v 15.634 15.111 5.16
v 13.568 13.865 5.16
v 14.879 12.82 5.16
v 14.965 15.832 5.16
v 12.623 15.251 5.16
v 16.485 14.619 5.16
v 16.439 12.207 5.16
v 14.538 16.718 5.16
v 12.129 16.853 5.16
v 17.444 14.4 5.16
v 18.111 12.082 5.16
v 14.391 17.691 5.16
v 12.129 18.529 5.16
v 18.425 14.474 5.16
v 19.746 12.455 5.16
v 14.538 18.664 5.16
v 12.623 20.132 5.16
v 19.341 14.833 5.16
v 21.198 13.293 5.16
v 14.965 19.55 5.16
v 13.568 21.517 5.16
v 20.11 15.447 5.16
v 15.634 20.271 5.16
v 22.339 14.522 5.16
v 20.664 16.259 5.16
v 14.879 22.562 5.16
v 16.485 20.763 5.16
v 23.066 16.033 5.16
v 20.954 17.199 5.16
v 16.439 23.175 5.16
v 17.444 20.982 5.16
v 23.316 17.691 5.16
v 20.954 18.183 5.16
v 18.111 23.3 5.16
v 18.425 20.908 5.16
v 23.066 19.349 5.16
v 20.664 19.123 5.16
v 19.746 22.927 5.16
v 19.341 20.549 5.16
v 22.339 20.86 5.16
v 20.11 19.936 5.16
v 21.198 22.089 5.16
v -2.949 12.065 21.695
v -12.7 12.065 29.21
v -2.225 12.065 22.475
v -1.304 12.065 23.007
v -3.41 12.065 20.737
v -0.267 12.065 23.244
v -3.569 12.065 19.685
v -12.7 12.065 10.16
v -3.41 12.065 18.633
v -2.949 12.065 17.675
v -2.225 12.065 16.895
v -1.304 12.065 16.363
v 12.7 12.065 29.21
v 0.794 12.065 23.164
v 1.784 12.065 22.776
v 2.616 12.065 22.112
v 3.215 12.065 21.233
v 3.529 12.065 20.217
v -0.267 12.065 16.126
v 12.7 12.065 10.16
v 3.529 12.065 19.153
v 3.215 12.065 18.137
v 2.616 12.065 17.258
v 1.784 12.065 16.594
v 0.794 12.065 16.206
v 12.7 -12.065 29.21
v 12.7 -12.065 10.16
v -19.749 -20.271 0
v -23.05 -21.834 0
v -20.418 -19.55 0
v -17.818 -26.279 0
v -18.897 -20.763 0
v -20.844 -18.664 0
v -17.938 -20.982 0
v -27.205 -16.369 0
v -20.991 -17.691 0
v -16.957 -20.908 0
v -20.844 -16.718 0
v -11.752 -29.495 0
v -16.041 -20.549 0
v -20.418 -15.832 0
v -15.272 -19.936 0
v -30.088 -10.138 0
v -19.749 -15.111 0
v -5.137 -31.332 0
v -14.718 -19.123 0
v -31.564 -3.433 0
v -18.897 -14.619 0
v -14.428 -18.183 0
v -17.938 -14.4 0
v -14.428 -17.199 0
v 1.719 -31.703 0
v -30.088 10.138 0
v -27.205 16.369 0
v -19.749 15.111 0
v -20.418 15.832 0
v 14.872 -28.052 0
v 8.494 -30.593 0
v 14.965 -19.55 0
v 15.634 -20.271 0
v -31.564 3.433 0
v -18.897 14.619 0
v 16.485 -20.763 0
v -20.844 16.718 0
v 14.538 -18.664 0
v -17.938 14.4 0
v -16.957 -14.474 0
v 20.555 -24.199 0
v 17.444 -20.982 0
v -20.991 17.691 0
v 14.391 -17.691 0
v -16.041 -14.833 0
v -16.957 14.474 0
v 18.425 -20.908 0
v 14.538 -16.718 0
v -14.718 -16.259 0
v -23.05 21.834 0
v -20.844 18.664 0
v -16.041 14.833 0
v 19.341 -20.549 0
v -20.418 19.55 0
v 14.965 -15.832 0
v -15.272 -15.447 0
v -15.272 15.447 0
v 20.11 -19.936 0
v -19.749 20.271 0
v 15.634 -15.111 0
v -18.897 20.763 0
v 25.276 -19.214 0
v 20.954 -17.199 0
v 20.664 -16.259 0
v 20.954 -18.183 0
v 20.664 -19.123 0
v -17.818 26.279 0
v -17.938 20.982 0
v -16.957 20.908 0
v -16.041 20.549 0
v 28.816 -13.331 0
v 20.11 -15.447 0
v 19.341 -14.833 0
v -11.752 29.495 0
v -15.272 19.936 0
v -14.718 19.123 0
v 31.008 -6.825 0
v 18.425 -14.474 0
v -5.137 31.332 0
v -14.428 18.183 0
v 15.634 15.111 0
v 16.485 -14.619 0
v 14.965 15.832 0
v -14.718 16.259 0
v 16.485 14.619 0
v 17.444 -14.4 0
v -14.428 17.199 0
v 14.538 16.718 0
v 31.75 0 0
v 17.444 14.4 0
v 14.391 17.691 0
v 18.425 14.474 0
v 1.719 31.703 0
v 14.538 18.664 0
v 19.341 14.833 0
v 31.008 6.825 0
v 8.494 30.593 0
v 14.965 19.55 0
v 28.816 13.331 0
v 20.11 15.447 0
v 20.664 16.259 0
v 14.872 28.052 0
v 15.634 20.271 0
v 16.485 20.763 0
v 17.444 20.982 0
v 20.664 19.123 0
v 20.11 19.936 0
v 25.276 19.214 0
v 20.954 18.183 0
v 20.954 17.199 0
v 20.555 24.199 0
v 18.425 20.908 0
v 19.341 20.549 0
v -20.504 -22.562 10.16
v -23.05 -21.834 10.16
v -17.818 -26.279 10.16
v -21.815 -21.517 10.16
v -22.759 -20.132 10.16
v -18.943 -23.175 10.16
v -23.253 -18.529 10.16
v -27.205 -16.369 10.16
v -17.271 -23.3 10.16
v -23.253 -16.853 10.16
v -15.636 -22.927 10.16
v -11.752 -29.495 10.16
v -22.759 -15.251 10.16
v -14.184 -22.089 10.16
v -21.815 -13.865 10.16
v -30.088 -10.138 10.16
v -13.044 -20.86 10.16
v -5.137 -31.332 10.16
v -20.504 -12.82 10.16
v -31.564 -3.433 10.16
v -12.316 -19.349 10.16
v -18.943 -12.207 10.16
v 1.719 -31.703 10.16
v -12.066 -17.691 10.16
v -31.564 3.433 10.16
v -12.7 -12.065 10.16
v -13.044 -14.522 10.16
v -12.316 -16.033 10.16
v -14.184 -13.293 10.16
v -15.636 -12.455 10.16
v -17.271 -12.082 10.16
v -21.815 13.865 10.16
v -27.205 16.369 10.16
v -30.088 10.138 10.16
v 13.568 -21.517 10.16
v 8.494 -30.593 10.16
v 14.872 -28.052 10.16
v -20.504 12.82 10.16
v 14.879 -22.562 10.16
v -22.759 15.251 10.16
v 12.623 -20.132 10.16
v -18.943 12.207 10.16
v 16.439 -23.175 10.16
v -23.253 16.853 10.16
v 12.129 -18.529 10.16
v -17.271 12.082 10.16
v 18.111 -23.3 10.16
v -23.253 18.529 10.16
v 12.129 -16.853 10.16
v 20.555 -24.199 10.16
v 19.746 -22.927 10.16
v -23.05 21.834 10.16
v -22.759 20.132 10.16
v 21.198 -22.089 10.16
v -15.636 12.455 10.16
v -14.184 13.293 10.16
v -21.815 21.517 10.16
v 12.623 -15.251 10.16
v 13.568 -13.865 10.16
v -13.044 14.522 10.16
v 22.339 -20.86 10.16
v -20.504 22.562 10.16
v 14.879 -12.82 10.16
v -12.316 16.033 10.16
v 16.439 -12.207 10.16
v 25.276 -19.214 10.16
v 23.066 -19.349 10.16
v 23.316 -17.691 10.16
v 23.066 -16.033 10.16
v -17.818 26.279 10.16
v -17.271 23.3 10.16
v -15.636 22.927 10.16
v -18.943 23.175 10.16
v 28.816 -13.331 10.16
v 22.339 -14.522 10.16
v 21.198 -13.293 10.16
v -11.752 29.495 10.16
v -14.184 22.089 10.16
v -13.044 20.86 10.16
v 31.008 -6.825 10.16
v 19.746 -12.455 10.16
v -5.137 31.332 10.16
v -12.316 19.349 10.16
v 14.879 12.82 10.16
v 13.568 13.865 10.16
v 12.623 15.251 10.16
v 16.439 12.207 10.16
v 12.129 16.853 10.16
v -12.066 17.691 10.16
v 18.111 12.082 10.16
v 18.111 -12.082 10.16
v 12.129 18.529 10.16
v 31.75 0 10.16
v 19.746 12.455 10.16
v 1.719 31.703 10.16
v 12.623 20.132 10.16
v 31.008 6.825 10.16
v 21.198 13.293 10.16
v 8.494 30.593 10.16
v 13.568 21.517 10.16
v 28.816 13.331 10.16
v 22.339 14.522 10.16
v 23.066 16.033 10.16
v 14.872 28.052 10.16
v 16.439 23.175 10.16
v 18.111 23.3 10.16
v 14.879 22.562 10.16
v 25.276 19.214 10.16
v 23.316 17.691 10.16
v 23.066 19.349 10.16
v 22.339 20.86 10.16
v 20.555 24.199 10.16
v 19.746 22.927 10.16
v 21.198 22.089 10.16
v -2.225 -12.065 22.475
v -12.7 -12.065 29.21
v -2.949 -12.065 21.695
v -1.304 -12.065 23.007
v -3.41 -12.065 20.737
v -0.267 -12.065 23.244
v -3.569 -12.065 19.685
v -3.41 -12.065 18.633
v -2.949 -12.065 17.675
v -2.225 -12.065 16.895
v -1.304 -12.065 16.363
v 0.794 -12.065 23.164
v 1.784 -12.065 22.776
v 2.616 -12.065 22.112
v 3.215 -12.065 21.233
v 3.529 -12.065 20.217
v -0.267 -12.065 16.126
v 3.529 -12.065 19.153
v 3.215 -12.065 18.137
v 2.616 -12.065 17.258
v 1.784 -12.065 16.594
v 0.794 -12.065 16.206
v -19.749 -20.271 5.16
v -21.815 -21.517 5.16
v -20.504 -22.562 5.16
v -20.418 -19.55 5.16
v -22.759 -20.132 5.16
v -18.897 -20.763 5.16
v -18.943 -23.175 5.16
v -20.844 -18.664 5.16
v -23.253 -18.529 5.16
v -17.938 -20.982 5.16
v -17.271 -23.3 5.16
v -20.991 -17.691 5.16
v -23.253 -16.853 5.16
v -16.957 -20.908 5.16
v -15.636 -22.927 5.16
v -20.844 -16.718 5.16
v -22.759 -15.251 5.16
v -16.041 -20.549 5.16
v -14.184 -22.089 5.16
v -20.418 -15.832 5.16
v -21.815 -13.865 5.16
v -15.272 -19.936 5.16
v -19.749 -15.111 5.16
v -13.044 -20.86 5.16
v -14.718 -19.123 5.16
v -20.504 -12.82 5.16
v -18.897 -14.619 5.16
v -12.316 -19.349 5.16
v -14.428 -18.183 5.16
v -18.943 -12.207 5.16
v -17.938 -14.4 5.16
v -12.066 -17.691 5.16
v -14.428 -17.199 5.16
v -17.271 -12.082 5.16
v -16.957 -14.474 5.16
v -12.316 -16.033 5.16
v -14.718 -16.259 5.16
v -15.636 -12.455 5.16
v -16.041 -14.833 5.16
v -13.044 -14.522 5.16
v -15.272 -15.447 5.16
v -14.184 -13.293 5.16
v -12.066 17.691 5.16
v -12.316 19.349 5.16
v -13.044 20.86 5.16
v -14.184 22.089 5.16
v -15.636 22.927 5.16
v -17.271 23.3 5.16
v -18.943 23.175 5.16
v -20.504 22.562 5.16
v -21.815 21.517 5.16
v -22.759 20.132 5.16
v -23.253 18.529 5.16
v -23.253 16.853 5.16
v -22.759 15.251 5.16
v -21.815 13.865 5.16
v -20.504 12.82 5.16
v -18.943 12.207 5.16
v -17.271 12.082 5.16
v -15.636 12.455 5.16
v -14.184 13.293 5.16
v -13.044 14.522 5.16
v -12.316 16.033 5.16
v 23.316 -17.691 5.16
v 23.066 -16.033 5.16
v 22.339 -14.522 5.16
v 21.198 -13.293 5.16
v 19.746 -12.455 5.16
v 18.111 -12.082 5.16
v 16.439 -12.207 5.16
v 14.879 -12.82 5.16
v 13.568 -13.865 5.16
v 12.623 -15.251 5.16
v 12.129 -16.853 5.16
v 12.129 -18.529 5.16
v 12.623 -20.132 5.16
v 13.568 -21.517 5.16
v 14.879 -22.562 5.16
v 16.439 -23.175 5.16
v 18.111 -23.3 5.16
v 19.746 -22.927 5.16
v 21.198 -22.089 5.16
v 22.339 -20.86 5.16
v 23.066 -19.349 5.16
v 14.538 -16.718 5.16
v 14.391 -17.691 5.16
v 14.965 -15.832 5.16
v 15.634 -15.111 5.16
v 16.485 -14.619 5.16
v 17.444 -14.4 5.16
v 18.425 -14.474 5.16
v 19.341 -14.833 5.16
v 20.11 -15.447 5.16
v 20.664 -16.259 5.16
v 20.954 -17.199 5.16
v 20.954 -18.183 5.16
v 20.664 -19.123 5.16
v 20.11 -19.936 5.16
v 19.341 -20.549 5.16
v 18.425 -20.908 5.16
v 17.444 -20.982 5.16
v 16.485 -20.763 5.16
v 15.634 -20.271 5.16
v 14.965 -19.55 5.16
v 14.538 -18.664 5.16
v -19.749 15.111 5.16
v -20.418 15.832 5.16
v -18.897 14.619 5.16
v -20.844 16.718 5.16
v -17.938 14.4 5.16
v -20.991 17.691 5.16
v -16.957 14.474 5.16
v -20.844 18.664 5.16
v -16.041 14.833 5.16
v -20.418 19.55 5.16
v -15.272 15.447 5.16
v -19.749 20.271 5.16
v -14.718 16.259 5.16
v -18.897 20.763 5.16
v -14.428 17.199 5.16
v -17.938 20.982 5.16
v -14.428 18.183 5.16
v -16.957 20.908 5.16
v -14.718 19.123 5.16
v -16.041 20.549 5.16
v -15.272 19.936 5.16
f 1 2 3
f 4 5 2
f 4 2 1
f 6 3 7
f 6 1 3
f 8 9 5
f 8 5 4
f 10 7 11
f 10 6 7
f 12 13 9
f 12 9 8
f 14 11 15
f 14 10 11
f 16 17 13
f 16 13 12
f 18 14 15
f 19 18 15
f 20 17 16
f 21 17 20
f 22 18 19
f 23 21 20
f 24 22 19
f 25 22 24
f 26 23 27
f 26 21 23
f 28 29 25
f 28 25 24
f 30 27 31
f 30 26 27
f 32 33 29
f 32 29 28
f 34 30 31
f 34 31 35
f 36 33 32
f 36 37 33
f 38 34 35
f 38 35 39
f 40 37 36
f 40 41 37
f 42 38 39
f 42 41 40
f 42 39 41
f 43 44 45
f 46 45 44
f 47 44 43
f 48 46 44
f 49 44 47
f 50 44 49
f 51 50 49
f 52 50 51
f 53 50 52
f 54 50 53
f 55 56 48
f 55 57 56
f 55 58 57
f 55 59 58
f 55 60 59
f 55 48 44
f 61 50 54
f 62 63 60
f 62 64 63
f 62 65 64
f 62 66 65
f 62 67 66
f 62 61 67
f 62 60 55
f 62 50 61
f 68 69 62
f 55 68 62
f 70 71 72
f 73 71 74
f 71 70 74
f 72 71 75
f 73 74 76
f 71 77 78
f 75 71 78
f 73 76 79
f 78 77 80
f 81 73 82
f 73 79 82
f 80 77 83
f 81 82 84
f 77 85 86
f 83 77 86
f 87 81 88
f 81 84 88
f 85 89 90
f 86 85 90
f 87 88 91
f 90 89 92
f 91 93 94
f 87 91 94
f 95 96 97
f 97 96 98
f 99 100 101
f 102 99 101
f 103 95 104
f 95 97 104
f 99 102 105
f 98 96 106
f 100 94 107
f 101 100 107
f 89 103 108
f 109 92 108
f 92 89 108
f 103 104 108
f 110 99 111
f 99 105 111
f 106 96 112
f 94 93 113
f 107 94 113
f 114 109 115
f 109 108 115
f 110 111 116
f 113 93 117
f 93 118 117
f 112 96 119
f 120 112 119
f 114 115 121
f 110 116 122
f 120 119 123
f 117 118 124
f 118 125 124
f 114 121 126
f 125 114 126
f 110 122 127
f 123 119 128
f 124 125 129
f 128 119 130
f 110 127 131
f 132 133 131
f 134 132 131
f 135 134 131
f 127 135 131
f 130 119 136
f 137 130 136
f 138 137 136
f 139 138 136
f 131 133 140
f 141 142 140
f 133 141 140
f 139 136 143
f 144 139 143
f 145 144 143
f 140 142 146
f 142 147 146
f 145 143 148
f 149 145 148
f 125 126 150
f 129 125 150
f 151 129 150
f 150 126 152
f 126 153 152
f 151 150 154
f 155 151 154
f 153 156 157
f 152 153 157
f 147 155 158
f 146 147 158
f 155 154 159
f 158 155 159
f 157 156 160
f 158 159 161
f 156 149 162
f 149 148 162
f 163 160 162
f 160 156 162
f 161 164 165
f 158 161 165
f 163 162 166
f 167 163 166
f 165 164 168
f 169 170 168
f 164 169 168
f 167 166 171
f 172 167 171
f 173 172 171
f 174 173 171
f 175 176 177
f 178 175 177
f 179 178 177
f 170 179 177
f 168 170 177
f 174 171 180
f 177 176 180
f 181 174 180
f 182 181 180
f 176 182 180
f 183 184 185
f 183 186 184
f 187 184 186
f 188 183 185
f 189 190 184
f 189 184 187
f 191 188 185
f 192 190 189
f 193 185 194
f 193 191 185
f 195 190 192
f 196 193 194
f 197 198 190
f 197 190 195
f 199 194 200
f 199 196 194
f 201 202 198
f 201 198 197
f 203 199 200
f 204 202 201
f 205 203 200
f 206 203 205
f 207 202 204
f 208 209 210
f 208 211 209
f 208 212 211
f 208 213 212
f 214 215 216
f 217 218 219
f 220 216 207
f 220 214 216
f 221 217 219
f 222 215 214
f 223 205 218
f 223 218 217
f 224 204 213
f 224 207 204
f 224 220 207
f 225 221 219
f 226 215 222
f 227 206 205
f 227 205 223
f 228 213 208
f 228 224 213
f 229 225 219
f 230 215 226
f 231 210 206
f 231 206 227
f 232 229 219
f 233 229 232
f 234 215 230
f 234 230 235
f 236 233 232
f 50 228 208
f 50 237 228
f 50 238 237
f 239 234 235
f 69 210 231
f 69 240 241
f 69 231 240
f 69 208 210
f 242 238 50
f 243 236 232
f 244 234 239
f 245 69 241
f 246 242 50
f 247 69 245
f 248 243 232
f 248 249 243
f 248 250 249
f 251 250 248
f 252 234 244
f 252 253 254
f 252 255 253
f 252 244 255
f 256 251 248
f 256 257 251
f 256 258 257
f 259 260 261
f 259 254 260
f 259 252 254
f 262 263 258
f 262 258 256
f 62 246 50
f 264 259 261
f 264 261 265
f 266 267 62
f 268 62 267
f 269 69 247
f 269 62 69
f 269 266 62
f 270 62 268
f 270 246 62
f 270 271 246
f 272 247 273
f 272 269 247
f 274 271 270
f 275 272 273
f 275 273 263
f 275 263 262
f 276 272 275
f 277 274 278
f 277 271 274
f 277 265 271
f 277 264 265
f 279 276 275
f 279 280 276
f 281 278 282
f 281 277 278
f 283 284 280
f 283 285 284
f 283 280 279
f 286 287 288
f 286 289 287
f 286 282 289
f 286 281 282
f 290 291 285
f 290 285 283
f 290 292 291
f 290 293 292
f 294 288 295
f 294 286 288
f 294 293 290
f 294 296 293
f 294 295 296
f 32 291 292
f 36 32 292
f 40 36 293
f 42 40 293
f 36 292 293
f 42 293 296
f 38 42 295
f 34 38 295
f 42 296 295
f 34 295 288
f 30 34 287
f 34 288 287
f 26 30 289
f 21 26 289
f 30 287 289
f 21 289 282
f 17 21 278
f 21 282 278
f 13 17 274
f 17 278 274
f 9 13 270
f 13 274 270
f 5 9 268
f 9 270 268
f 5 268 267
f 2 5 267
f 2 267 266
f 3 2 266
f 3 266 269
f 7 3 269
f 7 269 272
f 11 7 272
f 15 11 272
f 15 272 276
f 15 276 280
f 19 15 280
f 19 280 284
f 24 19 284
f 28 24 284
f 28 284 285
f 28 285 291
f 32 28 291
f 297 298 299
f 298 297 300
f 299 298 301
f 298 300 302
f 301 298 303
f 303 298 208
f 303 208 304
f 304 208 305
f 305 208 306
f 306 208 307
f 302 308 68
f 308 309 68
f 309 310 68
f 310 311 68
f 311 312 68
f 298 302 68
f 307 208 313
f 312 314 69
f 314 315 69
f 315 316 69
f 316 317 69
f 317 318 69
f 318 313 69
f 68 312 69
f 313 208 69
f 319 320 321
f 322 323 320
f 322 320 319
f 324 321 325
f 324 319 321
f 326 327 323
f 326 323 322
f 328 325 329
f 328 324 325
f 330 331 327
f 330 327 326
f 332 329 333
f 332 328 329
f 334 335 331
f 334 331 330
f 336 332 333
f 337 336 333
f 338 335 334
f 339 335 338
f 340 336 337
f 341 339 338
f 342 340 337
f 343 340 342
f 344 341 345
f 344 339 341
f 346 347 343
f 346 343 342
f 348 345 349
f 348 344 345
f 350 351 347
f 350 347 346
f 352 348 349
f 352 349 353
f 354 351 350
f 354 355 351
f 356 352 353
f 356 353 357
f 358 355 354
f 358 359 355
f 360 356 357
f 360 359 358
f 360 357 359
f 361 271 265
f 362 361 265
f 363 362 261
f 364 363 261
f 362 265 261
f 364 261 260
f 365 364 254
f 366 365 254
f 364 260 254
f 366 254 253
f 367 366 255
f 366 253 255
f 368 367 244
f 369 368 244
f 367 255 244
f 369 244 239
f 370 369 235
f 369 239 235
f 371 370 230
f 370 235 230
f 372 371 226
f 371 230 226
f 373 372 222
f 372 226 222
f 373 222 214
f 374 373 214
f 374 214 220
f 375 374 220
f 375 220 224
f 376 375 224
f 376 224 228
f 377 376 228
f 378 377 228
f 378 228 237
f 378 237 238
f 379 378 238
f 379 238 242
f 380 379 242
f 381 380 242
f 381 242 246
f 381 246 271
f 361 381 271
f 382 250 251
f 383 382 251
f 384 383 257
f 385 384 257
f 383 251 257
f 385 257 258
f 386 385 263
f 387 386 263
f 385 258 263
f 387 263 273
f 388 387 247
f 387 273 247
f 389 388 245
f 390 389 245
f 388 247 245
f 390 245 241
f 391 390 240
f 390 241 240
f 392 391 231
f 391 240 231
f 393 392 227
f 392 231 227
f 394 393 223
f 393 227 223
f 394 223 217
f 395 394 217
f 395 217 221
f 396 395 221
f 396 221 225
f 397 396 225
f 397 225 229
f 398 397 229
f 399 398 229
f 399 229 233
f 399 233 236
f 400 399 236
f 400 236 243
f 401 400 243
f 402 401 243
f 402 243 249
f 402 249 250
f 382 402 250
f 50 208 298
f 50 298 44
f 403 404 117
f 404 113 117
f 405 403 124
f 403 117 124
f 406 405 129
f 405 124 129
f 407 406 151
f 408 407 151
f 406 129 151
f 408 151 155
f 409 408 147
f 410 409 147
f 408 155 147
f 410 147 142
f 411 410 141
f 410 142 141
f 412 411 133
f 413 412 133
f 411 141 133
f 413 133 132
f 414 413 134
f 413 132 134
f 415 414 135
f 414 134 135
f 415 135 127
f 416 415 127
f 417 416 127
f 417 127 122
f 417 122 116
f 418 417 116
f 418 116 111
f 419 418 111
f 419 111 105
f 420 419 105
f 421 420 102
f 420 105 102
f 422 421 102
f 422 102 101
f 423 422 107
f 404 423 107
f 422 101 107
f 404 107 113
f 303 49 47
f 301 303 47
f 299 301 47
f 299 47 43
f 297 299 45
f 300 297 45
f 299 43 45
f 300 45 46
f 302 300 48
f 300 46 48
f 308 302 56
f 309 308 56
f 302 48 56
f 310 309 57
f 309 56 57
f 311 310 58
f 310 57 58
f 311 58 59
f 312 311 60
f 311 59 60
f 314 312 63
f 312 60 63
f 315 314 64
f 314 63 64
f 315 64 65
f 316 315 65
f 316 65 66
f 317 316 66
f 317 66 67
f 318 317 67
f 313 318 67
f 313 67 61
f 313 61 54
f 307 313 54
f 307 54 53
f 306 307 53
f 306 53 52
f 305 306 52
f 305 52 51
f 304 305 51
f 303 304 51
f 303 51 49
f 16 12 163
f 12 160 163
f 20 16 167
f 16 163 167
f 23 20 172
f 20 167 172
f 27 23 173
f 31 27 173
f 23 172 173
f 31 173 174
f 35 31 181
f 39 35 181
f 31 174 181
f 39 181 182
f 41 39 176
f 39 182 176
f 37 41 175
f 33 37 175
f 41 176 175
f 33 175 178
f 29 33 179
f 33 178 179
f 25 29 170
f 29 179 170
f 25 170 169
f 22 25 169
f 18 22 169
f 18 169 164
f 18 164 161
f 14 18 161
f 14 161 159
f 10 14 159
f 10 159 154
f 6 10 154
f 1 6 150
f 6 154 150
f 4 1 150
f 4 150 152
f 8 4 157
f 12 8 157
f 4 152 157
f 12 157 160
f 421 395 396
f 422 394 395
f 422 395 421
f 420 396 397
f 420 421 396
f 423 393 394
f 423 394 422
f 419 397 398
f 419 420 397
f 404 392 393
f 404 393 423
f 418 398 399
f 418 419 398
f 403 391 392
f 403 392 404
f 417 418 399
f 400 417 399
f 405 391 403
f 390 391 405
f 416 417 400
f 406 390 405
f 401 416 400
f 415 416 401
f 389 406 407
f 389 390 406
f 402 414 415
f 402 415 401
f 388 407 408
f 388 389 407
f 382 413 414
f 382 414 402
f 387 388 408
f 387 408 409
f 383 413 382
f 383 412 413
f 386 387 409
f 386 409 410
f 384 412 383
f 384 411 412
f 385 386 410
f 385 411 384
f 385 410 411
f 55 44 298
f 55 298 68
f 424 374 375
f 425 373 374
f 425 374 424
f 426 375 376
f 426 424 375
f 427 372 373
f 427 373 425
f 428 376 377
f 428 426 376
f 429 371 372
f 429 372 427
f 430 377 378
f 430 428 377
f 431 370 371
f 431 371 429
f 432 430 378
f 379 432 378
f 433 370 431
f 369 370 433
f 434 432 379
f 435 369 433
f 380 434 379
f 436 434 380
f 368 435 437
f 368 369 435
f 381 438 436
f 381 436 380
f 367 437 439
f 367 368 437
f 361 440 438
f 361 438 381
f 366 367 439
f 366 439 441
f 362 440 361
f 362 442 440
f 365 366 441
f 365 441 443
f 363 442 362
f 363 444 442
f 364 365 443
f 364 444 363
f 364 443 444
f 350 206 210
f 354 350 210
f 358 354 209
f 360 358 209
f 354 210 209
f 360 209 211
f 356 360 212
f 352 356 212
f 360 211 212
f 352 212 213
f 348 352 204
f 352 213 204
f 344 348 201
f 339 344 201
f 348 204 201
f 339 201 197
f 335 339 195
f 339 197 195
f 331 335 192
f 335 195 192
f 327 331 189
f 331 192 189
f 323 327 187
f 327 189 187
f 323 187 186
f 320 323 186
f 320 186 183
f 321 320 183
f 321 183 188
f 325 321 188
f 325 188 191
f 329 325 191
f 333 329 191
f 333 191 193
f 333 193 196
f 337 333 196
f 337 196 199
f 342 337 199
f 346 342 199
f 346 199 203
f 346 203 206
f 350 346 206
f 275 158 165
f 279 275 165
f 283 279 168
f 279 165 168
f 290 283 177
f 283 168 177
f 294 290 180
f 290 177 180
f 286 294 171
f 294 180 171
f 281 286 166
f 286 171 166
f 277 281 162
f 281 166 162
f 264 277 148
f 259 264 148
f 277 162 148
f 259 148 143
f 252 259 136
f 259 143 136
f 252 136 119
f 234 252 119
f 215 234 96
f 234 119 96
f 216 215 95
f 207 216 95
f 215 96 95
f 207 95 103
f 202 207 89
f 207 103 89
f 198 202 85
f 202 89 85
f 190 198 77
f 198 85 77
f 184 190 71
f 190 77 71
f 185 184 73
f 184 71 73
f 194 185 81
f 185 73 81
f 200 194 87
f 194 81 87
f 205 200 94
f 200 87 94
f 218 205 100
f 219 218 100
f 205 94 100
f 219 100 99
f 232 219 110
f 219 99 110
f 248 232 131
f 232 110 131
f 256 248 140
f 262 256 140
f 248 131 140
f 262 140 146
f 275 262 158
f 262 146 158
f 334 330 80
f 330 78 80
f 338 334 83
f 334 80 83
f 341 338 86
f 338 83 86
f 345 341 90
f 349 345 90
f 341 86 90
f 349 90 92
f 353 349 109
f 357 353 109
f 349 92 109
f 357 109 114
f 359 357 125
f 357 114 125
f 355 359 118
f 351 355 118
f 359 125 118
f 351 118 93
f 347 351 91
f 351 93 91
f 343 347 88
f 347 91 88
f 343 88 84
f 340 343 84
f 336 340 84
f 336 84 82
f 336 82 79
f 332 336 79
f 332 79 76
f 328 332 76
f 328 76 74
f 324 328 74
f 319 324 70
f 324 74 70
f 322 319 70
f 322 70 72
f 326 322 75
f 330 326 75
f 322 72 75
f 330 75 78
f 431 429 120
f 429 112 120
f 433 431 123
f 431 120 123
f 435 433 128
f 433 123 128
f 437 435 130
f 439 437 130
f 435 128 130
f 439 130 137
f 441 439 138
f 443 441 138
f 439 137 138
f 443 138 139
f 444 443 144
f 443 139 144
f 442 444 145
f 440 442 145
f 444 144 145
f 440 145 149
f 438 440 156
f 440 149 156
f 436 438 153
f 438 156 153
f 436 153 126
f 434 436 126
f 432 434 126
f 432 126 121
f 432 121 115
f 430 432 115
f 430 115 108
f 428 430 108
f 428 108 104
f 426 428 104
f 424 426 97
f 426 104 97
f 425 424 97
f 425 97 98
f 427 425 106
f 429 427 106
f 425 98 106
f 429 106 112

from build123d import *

# Parameters (mm, degrees)
F0_R           = 31.75
F1_DEPTH       = 10.16
F2_W           = 25.4
F2_H           = 24.13
F3_DEPTH       = 19.05
F5_D           = 6.6
F5_CBORE_D     = 11.25
F5_CBORE_DEPTH = 5
F7_D           = 7.1374


with BuildPart() as f1:
    # F0 (on Top) → F1 (new body)
    with BuildSketch(Plane.XY):
        Circle(F0_R)
    extrude(amount=F1_DEPTH)

    # F2 (on face) → F3 (join)
    with BuildSketch(Plane.XY.offset(10.16)):
        Rectangle(F2_W, F2_H)
    extrude(amount=F3_DEPTH)

    # F5 (through all)
    with Locations(Plane.XY.offset(10.16)):
        with Locations((-17.6911045585, 17.6911045585), (17.6911045585, 17.6911045585), (-17.6911045585, -17.6911045585), (17.6911045585, -17.6911045585)):
            CounterBoreHole(F5_D / 2, F5_CBORE_D / 2, F5_CBORE_DEPTH)

    # F7 (through all)
    with Locations(Plane.XZ.offset(12.065)):
        with Locations((0, 19.685)):
            Hole(F7_D / 2)


solid = f1.part
